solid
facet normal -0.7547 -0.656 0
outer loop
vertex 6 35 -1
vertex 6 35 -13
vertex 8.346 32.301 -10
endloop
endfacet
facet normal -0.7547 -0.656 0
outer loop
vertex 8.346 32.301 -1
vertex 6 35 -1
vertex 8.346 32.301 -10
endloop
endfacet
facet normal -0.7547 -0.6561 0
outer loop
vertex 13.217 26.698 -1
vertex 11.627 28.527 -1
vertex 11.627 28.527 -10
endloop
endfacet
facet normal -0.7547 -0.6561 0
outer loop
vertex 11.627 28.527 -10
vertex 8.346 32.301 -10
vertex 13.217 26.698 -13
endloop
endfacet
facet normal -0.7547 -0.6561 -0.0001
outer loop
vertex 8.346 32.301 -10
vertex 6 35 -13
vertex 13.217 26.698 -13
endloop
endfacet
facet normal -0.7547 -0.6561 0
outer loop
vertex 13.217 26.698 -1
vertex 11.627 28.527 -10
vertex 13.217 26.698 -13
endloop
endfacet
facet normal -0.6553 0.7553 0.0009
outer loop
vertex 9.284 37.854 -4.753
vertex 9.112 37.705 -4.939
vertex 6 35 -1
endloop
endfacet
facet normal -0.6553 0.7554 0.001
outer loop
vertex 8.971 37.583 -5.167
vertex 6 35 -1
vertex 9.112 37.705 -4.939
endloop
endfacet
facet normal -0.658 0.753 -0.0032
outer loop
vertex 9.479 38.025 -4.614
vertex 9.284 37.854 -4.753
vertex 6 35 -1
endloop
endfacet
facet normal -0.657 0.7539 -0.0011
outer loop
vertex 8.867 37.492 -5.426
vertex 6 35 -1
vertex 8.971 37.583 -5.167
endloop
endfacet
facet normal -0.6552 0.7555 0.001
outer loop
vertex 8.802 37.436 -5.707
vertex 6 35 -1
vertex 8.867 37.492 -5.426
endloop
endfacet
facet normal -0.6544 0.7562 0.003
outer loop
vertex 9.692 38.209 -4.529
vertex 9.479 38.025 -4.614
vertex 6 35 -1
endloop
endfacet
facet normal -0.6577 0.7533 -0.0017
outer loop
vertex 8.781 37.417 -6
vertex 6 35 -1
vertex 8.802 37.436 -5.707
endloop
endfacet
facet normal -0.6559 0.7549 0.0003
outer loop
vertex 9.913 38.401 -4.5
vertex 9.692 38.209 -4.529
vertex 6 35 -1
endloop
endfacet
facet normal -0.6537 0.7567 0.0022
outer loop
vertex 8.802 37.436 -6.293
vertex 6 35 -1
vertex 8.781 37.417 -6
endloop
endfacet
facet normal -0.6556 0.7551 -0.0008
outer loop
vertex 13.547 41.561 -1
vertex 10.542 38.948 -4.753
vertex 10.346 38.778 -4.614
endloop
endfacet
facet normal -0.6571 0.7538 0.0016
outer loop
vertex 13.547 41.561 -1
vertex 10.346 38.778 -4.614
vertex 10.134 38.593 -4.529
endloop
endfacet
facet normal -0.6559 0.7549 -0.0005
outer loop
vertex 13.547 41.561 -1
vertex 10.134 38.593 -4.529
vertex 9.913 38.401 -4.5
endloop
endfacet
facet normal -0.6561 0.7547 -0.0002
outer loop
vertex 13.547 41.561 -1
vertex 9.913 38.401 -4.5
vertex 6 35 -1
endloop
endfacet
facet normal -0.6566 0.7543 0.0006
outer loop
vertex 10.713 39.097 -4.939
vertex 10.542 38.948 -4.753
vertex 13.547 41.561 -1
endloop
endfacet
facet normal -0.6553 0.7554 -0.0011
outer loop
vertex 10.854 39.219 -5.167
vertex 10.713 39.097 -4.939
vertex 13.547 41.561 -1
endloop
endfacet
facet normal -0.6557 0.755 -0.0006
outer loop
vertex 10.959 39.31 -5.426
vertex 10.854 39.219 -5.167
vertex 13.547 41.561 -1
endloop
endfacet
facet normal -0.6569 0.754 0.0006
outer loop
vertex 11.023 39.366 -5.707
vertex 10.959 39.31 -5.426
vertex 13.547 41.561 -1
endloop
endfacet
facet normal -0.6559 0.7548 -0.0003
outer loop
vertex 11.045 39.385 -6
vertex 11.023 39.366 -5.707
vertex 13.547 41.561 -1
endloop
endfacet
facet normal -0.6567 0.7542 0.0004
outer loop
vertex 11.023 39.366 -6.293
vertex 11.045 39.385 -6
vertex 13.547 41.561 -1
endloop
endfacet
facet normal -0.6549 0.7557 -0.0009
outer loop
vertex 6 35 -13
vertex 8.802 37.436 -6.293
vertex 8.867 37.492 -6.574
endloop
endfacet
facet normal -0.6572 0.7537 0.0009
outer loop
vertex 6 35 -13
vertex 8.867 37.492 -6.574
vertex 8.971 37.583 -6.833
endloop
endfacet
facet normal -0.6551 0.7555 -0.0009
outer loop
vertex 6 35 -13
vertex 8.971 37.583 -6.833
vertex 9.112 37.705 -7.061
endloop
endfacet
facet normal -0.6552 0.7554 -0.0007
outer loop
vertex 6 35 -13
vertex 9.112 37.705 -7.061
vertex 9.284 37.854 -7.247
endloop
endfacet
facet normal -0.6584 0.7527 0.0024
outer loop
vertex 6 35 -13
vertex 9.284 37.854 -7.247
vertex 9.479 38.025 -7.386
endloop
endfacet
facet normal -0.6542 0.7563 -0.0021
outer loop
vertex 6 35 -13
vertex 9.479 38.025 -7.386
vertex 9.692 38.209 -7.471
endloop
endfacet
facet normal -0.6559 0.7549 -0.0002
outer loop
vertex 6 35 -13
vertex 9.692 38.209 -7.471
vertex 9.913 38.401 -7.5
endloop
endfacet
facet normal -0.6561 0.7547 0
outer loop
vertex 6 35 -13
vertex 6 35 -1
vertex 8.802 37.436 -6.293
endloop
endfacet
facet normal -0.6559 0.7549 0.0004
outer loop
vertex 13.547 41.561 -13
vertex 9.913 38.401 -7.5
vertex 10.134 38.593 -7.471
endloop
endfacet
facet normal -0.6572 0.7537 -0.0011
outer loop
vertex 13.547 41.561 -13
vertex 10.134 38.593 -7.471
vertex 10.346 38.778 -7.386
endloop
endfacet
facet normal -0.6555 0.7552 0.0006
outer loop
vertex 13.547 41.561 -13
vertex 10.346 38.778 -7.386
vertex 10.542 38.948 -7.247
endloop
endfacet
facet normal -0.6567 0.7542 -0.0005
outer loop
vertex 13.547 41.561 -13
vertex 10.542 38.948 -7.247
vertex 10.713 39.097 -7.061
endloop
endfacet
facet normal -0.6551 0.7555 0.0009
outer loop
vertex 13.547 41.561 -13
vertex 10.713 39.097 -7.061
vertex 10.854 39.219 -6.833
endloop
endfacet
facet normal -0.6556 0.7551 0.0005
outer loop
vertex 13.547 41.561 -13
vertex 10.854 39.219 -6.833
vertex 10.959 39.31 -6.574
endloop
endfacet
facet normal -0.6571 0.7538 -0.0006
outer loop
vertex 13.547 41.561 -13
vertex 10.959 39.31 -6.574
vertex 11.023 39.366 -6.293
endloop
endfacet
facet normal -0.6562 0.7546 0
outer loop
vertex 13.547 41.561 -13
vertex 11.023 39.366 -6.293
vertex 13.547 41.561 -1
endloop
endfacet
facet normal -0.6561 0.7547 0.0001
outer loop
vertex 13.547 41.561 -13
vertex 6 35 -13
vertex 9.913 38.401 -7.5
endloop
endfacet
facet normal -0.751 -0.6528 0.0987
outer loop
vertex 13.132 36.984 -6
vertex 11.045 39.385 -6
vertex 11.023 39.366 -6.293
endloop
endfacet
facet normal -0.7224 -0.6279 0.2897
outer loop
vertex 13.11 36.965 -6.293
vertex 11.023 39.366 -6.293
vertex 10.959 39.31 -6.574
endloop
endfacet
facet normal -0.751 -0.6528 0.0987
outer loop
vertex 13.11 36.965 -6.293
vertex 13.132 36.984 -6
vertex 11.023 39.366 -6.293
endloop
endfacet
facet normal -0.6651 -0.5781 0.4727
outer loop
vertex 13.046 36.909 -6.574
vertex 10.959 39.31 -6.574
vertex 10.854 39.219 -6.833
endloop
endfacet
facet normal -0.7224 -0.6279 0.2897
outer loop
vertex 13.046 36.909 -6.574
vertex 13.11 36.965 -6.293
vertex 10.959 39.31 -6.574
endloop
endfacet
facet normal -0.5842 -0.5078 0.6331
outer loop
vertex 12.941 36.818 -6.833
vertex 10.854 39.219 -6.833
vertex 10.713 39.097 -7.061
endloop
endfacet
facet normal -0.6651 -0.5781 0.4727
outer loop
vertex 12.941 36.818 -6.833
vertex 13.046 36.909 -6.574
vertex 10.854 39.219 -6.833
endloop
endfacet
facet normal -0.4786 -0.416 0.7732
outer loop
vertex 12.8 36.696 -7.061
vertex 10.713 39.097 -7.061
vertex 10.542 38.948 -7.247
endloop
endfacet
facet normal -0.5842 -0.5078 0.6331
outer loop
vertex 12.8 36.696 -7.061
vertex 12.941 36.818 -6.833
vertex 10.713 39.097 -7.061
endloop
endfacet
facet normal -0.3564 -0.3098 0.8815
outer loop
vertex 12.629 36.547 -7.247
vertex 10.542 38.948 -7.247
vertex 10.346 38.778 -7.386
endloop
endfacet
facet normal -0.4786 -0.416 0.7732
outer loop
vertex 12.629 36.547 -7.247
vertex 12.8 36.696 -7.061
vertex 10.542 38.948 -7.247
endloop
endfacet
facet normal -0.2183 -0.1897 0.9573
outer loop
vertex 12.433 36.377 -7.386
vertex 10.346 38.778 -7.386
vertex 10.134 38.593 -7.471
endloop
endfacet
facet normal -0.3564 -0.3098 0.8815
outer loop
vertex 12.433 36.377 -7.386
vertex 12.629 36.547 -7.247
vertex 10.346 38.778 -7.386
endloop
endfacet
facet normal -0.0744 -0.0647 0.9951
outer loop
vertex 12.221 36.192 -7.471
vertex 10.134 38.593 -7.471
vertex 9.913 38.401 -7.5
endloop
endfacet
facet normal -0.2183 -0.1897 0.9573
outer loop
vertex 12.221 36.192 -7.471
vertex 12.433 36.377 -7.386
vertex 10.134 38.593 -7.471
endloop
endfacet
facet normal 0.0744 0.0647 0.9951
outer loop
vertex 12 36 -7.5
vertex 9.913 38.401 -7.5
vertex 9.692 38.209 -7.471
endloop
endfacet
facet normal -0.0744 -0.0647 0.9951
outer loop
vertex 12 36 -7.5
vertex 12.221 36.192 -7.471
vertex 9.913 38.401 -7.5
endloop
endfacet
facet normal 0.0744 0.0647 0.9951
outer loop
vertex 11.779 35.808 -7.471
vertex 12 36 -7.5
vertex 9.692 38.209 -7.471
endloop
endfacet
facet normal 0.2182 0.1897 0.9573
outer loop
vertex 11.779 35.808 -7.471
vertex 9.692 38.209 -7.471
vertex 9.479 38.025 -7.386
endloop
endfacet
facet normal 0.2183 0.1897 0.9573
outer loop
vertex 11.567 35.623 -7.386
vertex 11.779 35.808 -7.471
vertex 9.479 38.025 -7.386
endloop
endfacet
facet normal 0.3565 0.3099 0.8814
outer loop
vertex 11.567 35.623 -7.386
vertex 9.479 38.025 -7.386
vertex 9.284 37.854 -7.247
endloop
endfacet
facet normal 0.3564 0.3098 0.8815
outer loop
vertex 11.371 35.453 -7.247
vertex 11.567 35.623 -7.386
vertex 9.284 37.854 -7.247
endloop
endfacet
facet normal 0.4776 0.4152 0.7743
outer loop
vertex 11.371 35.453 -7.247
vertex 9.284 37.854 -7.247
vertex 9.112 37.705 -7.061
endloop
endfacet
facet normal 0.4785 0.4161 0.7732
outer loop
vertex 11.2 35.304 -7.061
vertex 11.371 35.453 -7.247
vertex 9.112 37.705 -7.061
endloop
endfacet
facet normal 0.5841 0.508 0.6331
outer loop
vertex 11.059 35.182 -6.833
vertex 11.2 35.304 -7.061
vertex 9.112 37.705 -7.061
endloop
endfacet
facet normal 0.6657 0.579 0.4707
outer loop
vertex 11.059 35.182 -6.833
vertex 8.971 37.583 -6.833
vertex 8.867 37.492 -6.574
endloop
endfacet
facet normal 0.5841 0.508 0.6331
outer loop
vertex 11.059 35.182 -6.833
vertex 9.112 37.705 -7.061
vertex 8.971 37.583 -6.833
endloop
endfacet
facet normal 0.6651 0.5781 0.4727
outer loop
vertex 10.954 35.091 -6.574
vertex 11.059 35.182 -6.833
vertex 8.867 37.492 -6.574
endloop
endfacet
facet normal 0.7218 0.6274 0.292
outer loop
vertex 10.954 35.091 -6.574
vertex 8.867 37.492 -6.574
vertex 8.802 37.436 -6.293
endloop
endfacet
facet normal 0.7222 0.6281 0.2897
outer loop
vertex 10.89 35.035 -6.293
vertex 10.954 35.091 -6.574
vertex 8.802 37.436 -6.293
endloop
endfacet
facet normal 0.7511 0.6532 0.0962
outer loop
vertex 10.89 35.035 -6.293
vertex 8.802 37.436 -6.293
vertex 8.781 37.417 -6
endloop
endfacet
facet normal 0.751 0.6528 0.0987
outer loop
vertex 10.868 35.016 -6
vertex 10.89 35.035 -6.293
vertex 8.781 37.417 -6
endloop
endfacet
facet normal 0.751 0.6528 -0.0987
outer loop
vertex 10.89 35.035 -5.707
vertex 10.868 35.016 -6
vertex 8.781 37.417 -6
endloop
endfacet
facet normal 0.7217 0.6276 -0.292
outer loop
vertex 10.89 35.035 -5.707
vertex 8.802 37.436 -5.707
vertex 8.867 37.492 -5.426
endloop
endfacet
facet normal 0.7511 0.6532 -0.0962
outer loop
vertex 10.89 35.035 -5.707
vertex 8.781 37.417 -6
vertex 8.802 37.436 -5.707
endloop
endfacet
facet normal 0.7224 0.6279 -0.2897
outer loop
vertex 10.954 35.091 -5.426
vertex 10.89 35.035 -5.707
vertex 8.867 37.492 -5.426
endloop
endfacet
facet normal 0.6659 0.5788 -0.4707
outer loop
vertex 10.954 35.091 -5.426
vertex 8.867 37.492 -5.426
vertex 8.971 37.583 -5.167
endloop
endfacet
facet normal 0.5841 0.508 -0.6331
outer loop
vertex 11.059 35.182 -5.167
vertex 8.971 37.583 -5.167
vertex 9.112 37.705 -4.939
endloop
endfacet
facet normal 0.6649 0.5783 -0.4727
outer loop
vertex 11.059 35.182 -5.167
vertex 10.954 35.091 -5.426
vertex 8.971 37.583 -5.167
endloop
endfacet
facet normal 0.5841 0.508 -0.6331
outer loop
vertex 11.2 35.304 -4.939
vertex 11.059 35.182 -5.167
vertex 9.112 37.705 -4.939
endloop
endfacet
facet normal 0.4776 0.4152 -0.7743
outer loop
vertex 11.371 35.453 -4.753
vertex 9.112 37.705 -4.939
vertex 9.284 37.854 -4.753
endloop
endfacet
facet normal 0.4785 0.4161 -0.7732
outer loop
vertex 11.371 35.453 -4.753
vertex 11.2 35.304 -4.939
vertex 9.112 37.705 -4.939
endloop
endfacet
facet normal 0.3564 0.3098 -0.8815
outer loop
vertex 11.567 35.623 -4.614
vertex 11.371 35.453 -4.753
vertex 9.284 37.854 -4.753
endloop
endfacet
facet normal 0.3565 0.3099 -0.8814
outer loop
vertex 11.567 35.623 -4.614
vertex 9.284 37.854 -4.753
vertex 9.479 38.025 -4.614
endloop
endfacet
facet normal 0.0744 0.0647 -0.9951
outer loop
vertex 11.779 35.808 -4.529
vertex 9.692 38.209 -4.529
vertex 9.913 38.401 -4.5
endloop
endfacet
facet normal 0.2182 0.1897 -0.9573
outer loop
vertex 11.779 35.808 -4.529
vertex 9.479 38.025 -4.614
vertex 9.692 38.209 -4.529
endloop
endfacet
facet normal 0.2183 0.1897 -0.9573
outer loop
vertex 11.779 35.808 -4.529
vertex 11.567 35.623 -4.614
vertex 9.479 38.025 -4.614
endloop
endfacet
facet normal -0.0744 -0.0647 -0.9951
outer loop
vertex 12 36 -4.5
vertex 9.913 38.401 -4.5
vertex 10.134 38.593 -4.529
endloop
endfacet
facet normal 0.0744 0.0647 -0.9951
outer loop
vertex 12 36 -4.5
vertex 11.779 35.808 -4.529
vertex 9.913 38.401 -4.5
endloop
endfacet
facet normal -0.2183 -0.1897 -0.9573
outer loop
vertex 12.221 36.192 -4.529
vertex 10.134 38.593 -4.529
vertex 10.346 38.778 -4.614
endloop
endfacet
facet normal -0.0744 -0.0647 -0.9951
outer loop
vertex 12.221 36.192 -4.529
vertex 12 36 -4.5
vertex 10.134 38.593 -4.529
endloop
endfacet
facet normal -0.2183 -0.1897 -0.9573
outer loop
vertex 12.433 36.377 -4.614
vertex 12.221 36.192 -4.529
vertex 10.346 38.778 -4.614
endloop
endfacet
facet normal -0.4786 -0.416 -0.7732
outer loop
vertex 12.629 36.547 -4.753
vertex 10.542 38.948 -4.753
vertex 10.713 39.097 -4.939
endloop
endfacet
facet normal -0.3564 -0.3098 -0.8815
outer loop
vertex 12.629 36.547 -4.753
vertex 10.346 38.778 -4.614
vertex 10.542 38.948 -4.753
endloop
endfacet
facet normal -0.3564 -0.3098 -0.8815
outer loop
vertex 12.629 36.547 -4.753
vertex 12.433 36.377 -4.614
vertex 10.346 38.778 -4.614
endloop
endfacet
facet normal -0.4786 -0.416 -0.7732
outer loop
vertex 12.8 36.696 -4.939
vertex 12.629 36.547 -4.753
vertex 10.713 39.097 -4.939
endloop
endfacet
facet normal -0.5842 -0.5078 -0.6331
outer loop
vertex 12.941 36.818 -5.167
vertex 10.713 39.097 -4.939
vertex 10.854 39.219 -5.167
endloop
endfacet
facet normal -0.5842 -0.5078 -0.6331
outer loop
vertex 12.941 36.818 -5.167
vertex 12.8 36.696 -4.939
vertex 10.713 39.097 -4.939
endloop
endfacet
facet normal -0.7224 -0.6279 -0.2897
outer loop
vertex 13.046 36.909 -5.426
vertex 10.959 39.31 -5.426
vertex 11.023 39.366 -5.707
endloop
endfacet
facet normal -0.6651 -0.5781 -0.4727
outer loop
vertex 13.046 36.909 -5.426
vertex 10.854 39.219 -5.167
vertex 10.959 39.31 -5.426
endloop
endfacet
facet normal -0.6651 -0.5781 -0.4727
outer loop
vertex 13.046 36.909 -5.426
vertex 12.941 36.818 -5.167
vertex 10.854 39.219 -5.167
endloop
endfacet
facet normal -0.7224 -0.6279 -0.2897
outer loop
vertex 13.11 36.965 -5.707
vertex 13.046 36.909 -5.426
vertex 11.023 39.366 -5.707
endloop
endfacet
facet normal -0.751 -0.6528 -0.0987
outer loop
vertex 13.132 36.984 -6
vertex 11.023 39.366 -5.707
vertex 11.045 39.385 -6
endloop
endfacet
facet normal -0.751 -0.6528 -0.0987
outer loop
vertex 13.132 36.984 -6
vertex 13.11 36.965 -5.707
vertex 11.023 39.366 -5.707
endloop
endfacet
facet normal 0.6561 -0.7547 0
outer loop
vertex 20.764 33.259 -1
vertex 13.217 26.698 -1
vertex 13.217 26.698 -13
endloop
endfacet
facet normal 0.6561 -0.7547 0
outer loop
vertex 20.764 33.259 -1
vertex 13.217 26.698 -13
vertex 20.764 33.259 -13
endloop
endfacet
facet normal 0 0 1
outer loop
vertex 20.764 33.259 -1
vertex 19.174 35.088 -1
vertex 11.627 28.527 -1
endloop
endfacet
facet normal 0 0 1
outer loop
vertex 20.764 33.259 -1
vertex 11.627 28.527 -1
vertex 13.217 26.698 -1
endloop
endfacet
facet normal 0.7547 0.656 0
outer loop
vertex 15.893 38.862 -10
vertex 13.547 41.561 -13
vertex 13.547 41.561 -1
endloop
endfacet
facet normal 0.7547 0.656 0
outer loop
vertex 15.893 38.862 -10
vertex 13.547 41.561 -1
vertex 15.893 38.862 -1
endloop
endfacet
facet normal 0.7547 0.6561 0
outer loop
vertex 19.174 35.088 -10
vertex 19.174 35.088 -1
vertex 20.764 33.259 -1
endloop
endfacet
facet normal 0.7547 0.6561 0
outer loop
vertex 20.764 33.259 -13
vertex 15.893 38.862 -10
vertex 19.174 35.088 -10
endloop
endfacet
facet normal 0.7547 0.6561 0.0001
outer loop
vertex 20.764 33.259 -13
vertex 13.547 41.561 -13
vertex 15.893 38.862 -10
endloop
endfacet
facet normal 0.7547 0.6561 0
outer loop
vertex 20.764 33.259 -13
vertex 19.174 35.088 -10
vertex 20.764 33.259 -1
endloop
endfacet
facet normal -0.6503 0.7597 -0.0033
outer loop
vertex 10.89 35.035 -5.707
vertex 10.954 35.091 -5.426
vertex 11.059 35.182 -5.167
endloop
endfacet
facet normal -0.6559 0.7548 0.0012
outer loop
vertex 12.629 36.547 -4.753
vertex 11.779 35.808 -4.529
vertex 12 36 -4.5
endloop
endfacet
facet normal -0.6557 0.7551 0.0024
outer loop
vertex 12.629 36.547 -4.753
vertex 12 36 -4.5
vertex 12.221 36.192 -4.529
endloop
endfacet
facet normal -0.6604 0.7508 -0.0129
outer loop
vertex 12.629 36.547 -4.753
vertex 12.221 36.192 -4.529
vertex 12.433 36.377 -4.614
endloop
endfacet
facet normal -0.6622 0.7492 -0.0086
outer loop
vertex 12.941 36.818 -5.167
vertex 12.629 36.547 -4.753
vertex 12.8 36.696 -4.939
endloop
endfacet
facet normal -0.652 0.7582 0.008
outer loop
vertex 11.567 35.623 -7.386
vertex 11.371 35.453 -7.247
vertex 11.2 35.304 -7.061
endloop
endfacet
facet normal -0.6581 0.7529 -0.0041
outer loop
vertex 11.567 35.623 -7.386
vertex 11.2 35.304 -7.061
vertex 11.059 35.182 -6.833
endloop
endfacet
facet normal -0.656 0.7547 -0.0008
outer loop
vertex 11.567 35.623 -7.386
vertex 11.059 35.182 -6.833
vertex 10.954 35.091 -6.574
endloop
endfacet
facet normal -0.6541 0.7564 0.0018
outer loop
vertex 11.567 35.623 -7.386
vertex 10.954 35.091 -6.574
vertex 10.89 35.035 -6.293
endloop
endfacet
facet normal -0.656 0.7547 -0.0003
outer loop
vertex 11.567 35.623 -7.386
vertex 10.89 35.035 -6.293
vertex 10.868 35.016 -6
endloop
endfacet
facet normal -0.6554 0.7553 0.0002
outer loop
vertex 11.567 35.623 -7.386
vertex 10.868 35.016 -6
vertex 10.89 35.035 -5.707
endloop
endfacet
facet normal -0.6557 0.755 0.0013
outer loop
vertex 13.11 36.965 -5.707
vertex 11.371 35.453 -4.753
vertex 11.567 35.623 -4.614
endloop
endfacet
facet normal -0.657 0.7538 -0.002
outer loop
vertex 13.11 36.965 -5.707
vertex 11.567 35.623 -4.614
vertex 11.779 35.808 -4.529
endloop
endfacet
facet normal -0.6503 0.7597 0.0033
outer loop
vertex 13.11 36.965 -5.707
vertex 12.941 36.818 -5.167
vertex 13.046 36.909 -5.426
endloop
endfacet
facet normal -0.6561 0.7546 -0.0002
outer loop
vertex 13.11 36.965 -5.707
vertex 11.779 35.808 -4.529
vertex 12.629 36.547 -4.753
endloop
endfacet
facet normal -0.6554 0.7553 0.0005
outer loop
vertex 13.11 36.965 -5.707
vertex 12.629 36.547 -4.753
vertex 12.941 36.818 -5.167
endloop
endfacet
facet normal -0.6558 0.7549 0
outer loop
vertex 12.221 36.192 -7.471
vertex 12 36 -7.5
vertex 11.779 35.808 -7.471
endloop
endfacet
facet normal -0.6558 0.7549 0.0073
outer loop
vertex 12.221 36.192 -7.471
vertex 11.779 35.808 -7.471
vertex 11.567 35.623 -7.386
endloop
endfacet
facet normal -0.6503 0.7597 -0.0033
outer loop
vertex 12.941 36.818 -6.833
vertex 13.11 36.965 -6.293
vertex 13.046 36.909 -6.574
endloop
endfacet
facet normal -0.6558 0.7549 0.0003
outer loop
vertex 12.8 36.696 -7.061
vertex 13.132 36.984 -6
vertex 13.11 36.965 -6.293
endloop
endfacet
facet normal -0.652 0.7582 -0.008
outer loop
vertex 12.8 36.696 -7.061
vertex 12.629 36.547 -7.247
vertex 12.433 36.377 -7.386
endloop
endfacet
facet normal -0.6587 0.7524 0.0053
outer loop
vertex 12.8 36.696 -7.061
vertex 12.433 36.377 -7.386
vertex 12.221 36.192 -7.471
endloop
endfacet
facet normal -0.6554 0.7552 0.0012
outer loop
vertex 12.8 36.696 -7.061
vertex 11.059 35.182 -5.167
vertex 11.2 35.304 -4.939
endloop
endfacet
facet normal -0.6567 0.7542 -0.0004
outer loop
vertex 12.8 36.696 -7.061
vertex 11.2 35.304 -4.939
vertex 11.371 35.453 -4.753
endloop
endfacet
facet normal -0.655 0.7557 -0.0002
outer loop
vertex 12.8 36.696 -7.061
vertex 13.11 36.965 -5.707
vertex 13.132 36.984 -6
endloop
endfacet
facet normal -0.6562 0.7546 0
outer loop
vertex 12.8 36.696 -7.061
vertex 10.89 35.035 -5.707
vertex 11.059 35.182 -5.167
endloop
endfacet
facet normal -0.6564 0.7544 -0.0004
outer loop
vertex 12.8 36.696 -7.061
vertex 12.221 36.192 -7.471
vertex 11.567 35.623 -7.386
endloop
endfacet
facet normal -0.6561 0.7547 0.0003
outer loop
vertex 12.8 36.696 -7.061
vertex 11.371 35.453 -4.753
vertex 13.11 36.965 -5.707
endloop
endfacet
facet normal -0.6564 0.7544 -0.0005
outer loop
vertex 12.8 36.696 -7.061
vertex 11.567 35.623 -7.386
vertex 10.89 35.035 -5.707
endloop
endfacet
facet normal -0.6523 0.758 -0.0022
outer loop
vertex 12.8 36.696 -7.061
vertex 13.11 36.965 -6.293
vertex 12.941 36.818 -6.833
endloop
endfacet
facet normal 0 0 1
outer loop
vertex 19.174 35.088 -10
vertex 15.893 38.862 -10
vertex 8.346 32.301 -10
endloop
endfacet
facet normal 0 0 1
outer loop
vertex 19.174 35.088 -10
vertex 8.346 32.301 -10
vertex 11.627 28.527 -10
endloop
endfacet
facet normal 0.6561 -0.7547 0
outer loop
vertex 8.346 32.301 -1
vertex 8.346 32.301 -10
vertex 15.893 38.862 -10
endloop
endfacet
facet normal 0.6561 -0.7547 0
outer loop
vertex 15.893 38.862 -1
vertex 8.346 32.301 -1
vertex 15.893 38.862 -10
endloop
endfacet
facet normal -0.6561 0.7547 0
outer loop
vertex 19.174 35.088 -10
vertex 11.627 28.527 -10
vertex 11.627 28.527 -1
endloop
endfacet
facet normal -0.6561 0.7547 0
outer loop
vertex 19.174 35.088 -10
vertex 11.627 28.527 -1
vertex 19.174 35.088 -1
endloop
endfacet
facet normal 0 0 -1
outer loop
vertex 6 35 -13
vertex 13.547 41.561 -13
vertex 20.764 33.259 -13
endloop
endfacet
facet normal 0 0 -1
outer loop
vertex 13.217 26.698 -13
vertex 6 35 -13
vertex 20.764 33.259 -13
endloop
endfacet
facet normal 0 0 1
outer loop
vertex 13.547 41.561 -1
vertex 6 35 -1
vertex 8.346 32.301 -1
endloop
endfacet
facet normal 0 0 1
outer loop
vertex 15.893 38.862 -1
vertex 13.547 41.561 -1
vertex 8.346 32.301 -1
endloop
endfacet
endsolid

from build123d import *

# Parameters (mm, degrees)
CYLINDER046_R               = 1.5
CYLINDER046_DEPTH           = 10
CYLINDER046_ROLL_ANGLE      = -90
CYLINDER046_PLACEMENT_ANGLE = 41
BOX014_W                    = 5
BOX014_H                    = 11
BOX014_DEPTH                = 9
BOX014_PLACEMENT_ANGLE      = 49
BOX013_W                    = 11
BOX013_H                    = 10
BOX013_DEPTH                = 12
BOX013_PLACEMENT_ANGLE      = 49


with BuildPart() as cylinder046:
    # Cylinder046 → Cylinder046 (new body)
    with BuildSketch(Plane.XY):
        Circle(CYLINDER046_R)
    extrude(amount=CYLINDER046_DEPTH)


with BuildPart() as cylinder046_1:
    # Cylinder046 roll: moved
    add(cylinder046.part.rotate(Axis((0, 0, 0), (1, 0, 0)), CYLINDER046_ROLL_ANGLE))


with BuildPart() as cylinder046_2:
    # Cylinder046 placement: moved
    add(cylinder046_1.part.moved(Location((12, 36, -6))).rotate(Axis((12, 36, -6), (0, 0, 1)), CYLINDER046_PLACEMENT_ANGLE))


with BuildPart() as box014:
    # Box014 → Box014 (new body)
    with BuildSketch(Plane.XY):
        with Locations((2.5, 5.5)):
            Rectangle(BOX014_W, BOX014_H)
    extrude(amount=BOX014_DEPTH)


with BuildPart() as box014_1:
    # Box014 placement: moved
    add(box014.part.moved(Location((8, 32, -10))).rotate(Axis((8, 32, -10), (0, 0, -1)), BOX014_PLACEMENT_ANGLE))


with BuildPart() as cut042:
    # Box013 → Box013 (new body)
    with BuildSketch(Plane.XY):
        with Locations((5.5, 5)):
            Rectangle(BOX013_W, BOX013_H)
    extrude(amount=BOX013_DEPTH)


with BuildPart() as cut042_1:
    # Box013 placement: moved
    add(cut042.part.moved(Location((6, 35, -13))).rotate(Axis((6, 35, -13), (0, 0, -1)), BOX013_PLACEMENT_ANGLE))

    # Cut041: cut Box014
    add(box014_1.part, mode=Mode.SUBTRACT)

    # Cut042: cut Cylinder046
    add(cylinder046_2.part, mode=Mode.SUBTRACT)


solid = cut042_1.part
